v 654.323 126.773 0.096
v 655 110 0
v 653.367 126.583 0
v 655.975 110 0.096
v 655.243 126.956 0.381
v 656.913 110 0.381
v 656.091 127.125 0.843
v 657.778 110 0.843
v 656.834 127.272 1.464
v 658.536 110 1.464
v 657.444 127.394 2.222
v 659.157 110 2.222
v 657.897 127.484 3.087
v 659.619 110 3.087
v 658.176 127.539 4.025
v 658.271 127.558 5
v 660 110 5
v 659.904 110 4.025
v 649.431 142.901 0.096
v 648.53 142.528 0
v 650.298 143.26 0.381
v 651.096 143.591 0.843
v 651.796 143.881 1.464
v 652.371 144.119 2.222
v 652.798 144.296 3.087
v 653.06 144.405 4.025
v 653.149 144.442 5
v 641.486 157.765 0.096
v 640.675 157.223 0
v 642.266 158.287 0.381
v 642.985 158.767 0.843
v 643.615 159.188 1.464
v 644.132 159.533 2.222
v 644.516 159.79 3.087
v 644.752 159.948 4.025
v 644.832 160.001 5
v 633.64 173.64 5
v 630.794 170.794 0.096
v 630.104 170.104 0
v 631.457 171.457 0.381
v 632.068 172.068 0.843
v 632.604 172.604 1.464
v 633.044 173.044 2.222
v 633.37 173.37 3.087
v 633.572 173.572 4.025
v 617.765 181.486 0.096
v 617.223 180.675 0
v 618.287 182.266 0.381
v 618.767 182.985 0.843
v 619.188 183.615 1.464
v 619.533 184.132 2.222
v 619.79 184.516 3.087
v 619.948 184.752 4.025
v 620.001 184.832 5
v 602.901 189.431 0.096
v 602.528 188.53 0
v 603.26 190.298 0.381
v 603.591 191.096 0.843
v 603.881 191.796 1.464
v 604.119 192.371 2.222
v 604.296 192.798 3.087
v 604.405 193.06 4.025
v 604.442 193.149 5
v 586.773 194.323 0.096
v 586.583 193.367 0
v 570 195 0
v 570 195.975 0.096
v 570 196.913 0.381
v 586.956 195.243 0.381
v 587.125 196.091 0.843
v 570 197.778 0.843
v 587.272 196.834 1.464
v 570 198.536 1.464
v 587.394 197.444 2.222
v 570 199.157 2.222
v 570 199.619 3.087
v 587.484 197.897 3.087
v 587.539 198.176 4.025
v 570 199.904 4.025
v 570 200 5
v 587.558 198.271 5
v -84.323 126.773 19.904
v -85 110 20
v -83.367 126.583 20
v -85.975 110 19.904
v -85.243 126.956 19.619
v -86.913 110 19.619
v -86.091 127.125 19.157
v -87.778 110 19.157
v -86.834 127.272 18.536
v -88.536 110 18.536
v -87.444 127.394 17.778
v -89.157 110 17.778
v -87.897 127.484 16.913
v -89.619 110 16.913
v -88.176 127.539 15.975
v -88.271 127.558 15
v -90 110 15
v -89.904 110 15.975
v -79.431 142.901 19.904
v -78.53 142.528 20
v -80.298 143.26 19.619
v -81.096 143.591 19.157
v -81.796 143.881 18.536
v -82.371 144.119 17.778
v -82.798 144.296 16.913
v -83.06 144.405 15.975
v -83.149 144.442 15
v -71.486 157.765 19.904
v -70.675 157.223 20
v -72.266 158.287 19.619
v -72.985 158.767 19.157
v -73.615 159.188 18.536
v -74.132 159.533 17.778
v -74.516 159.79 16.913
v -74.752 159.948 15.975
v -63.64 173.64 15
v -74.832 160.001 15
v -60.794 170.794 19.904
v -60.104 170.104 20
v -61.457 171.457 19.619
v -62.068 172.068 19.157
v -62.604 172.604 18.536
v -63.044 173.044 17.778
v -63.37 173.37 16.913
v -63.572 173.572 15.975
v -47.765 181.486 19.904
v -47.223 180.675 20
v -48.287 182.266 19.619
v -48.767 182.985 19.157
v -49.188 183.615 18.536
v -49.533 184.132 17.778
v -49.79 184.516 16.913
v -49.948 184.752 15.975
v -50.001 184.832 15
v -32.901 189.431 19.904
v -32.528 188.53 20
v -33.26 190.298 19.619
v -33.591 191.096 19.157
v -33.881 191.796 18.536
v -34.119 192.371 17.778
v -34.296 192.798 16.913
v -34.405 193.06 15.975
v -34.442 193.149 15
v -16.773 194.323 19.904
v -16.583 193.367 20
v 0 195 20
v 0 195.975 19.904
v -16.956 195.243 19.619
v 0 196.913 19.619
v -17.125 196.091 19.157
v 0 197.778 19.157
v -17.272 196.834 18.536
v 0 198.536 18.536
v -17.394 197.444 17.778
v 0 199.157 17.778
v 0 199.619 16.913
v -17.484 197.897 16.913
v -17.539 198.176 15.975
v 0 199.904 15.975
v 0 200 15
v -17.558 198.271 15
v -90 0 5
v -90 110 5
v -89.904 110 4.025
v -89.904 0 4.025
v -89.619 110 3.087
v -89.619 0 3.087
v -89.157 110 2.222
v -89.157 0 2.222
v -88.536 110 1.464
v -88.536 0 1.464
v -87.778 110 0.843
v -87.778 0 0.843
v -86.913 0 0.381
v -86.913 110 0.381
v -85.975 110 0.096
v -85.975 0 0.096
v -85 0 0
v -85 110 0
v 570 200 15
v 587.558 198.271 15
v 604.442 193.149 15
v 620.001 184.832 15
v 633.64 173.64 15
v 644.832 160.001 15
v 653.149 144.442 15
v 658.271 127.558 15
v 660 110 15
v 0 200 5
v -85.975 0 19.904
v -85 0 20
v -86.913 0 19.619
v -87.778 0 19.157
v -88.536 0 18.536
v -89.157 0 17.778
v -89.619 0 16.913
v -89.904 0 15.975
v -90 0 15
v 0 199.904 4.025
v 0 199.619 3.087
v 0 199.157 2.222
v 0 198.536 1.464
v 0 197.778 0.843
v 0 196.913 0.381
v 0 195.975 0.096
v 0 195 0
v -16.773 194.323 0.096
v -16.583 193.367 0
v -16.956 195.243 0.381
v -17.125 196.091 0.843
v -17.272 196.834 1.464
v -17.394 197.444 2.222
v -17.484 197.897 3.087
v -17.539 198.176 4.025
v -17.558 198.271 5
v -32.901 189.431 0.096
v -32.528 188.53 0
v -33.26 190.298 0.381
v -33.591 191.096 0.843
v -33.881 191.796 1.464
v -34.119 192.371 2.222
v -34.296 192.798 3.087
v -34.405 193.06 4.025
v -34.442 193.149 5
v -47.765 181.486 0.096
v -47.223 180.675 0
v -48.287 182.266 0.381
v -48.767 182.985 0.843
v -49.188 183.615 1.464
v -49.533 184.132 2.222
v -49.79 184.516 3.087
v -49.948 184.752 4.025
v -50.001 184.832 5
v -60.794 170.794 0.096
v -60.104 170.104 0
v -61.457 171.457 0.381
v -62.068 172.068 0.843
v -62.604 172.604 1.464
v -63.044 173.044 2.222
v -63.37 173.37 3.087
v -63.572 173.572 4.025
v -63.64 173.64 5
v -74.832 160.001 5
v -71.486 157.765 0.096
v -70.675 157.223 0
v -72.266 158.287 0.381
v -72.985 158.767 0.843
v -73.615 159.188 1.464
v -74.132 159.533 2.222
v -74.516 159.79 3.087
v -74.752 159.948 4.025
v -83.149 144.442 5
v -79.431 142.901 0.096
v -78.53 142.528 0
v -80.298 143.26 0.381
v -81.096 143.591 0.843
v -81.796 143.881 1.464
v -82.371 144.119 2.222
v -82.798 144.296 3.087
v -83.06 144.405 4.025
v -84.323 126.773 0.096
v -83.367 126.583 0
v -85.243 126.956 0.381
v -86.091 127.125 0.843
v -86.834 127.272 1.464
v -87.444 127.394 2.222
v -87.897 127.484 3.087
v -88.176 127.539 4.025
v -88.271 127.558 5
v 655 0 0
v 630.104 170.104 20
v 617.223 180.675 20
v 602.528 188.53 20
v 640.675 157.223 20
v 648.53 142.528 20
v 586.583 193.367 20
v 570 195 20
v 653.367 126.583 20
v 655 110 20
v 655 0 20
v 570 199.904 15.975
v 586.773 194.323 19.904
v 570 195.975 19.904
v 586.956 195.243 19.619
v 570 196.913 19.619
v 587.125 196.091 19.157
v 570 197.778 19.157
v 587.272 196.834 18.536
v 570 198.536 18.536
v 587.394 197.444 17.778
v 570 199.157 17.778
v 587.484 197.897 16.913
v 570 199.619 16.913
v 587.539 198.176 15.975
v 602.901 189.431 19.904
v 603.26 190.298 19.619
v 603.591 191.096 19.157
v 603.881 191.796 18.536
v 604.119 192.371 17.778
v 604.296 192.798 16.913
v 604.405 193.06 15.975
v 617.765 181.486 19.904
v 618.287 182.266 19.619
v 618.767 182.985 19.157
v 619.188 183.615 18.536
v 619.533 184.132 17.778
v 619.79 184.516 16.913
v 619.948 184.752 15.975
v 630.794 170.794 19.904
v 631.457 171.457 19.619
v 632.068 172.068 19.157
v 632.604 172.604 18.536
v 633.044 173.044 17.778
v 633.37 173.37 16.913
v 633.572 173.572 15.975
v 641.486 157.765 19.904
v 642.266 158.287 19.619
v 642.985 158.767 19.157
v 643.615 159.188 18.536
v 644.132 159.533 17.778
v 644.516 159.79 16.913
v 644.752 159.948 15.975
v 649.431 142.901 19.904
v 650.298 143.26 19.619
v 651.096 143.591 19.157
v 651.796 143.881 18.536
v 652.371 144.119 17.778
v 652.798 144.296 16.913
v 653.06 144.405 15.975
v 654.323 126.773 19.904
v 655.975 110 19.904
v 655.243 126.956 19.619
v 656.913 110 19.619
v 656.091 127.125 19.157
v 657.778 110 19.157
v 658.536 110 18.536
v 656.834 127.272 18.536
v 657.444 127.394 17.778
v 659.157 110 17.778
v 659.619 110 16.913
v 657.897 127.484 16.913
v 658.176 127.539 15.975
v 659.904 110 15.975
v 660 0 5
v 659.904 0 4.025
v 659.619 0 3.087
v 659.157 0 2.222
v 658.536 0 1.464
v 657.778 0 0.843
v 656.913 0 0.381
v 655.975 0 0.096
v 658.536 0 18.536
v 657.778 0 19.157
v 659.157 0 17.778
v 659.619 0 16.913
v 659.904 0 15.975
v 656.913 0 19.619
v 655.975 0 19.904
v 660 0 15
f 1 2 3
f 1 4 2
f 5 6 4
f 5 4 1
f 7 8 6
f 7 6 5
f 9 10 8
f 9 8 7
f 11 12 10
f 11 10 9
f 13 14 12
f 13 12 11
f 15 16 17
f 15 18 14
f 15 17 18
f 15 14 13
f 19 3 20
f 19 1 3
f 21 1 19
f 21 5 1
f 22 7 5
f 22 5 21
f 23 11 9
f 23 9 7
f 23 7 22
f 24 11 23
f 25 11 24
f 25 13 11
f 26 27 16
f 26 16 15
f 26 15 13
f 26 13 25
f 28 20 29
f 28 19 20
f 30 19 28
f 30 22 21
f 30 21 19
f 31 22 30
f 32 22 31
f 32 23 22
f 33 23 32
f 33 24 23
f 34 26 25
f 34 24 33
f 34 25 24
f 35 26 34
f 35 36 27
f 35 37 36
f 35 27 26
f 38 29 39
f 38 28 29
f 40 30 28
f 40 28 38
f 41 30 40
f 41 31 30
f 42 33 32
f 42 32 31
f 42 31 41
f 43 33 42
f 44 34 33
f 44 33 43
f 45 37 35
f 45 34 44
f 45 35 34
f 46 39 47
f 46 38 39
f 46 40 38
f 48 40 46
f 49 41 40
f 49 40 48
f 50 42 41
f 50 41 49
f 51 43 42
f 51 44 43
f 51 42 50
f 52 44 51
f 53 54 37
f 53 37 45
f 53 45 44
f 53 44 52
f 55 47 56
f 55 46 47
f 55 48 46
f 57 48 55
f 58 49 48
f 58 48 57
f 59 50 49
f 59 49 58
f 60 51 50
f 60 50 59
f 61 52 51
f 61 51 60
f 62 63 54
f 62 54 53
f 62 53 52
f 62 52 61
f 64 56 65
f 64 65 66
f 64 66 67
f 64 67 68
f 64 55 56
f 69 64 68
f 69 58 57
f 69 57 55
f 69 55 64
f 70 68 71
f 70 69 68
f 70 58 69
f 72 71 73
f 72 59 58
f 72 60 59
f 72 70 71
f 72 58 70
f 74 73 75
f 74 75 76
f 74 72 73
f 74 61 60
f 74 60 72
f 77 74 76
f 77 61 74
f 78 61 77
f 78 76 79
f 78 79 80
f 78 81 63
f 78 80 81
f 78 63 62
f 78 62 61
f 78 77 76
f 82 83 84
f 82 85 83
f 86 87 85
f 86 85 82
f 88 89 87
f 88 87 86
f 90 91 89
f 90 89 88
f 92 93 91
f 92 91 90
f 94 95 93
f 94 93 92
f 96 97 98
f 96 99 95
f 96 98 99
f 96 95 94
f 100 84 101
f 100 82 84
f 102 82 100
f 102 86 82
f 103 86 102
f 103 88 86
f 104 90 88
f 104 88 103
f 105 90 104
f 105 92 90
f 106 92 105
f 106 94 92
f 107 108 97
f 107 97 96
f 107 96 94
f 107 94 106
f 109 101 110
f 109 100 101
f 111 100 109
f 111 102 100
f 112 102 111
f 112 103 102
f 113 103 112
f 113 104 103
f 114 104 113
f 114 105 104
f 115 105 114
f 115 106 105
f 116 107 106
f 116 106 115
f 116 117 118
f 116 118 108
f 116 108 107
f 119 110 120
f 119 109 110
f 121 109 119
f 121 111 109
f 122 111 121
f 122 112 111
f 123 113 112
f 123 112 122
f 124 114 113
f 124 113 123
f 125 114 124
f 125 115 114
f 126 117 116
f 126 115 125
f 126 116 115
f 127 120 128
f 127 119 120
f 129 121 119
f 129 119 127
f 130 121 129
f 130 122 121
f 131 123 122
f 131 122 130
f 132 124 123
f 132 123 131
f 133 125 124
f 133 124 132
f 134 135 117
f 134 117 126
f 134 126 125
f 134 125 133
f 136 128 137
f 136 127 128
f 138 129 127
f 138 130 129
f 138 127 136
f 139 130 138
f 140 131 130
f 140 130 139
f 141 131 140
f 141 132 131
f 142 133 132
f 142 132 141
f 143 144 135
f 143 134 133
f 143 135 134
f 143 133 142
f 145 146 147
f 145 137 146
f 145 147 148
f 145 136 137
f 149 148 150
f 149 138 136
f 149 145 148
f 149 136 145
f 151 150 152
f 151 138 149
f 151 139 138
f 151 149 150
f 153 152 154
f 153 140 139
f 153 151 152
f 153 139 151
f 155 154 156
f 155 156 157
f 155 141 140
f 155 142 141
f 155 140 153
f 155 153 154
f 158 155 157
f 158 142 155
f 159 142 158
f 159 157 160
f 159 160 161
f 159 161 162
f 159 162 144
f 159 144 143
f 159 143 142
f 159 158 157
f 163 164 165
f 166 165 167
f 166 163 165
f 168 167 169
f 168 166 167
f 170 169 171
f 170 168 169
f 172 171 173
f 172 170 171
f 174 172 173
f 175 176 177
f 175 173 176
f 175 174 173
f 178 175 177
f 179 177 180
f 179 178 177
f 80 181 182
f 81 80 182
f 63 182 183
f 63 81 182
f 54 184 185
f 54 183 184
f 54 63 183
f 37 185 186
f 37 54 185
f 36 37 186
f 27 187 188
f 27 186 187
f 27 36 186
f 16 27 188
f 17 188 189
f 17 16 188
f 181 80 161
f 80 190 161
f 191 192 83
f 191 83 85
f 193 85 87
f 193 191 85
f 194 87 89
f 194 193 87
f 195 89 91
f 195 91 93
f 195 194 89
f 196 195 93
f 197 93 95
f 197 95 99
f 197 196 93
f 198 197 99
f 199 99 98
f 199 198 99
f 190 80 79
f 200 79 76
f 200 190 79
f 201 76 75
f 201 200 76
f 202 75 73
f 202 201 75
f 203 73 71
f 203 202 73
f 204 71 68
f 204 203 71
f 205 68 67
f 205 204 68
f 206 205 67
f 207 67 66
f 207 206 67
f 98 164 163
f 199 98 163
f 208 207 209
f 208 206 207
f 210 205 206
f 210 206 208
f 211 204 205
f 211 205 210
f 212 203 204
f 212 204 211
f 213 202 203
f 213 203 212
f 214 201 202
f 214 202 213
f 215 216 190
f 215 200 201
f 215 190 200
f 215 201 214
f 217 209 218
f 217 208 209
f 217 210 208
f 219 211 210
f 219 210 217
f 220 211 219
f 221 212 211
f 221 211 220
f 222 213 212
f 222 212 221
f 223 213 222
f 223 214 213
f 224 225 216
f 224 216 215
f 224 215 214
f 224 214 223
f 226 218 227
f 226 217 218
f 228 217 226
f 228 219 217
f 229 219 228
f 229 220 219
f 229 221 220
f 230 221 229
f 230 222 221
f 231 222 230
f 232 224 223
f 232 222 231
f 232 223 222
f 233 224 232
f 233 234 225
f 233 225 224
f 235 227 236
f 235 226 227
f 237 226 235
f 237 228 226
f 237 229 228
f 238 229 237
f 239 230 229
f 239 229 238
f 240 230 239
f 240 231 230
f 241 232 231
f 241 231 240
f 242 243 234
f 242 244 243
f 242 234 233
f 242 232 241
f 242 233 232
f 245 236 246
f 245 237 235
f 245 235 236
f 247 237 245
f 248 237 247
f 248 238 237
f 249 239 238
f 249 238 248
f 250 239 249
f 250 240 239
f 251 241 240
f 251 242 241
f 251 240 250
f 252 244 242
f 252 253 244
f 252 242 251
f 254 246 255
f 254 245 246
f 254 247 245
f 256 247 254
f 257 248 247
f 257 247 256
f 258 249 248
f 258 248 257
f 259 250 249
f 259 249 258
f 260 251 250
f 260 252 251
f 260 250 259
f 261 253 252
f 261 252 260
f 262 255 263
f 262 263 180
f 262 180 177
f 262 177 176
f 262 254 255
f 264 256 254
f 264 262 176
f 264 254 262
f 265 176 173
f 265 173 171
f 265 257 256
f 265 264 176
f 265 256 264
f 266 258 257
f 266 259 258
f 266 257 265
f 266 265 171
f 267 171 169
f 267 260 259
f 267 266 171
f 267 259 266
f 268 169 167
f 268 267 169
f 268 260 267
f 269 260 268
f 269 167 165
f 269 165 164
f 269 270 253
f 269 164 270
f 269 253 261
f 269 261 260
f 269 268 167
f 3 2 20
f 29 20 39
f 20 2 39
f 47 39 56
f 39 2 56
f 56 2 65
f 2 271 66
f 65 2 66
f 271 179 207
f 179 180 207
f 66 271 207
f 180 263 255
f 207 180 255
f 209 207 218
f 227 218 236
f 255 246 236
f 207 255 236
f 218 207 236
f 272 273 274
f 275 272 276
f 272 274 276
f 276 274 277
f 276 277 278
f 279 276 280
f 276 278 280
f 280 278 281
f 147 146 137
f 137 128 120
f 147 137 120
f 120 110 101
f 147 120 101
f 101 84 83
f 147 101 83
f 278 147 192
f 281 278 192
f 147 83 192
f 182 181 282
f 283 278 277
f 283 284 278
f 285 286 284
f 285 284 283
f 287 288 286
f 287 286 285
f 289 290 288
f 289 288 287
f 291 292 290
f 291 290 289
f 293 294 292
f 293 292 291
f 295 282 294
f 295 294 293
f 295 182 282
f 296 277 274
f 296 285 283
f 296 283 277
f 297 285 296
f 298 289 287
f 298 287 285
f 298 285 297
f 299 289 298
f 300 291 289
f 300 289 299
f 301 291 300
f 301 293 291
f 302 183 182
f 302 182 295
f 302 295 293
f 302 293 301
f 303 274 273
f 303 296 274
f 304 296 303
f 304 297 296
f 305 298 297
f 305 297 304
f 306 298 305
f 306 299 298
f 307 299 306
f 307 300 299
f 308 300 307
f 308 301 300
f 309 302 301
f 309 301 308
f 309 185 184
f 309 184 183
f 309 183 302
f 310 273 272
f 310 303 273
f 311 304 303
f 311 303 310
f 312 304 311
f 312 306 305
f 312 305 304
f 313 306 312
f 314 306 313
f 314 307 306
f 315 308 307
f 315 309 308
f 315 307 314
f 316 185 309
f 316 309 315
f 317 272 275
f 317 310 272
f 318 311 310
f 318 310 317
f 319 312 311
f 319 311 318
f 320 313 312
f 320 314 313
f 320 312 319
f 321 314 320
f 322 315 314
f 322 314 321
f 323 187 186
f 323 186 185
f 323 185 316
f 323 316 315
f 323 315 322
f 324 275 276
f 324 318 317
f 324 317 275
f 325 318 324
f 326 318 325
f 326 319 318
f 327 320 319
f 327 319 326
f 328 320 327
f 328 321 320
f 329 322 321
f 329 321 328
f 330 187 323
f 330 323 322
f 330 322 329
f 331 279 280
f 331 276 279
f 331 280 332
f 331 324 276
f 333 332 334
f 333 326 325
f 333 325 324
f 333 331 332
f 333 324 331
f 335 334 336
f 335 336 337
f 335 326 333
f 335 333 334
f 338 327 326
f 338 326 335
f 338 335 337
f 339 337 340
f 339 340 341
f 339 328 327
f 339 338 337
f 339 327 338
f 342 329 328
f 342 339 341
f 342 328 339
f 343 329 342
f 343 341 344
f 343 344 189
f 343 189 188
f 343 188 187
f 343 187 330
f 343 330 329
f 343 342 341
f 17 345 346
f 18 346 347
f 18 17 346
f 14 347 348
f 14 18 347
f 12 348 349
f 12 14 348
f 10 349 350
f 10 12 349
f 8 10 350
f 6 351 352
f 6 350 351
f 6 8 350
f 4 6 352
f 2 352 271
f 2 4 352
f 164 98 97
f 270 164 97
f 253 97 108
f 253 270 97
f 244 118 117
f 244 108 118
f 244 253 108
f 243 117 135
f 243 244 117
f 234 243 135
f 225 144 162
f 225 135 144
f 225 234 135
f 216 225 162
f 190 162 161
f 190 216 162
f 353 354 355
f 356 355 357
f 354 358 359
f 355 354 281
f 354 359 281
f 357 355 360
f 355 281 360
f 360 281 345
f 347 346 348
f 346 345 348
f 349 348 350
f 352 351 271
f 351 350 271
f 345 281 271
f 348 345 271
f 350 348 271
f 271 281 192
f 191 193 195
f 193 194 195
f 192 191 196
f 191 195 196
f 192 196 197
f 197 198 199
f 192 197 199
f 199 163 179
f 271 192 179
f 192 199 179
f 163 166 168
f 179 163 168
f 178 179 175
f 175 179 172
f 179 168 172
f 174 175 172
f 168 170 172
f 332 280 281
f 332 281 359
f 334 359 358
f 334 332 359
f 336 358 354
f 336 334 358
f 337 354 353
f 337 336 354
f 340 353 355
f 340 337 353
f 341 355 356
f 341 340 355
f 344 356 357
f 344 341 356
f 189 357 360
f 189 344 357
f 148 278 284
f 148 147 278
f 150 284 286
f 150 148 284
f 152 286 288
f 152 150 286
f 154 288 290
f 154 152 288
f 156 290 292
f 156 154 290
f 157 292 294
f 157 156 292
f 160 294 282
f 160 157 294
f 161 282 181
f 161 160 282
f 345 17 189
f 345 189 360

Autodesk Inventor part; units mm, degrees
ref_plane "YZ Plane" through (0, 0, 0) normal (1, 0, 0) x (0, 1, 0)
ref_plane "XZ Plane" through (0, 0, 0) normal (0, 1, 0) x (-1, 0, 0)
ref_plane "XY Plane" through (0, 0, 0) normal (0, 0, 1) x (1, 0, 0)
sketch "Sketch1" plane through (0, 0, 0) normal (1, 0, 0) x (0, 1, 0)
  line L0 (0, 0) -> (200, 0)
  line L1 (200, 0) -> (200, 20)
  line L2 (200, 20) -> (0, 20)
  line L3 (0, 20) -> (0, 0)
  dimension "d0" = 200
  dimension "d1" = 20
extrude "Extrusion1" add sketch "Sketch1" along normal blind 570
sketch "Sketch2" plane through (0, 0, 0) normal (0, 0, 1) x (1, 0, 0)
  line L0 (0, 200) -> (0, 0) projected
  line L1 (570, 200) -> (570, 0) projected
  line L2 (-90, 110) -> (-90, 0)
  line L3 (-90, 0) -> (0, 0)
  line L4 (0, 200) -> (0, 0)
  line L5 (570, 0) -> (570, 200)
  line L6 (660, 110) -> (660, 0)
  line L7 (660, 0) -> (570, 0)
  arc A0 (0, 200) -> (-90, 110) centre (0, 110) ccw
  arc A1 (660, 110) -> (570, 200) centre (570, 110) ccw
  point P0 (-40.5768, 141.5092)
  point P1 (615, 155)
  dimension "d11" = 90
  dimension "d12" = 90
extrude "Extrusion2" add sketch "Sketch2" along normal blind 20
fillet "Fillet1" radius 5 13 edges at (-90, 55, 20) (-63.6396, 173.6396, 20) (285, 200, 20) (633.6396, 173.6396, 0) (570, 200, 10) (660, 55, 0) (660, 110, 10) (-63.6396, 173.6396, 0) (0, 200, 10) (-90, 55, 0) (-90, 110, 10) (285, 200, 0) (660, 55, 20)
properties part number "Centre Wedge"
